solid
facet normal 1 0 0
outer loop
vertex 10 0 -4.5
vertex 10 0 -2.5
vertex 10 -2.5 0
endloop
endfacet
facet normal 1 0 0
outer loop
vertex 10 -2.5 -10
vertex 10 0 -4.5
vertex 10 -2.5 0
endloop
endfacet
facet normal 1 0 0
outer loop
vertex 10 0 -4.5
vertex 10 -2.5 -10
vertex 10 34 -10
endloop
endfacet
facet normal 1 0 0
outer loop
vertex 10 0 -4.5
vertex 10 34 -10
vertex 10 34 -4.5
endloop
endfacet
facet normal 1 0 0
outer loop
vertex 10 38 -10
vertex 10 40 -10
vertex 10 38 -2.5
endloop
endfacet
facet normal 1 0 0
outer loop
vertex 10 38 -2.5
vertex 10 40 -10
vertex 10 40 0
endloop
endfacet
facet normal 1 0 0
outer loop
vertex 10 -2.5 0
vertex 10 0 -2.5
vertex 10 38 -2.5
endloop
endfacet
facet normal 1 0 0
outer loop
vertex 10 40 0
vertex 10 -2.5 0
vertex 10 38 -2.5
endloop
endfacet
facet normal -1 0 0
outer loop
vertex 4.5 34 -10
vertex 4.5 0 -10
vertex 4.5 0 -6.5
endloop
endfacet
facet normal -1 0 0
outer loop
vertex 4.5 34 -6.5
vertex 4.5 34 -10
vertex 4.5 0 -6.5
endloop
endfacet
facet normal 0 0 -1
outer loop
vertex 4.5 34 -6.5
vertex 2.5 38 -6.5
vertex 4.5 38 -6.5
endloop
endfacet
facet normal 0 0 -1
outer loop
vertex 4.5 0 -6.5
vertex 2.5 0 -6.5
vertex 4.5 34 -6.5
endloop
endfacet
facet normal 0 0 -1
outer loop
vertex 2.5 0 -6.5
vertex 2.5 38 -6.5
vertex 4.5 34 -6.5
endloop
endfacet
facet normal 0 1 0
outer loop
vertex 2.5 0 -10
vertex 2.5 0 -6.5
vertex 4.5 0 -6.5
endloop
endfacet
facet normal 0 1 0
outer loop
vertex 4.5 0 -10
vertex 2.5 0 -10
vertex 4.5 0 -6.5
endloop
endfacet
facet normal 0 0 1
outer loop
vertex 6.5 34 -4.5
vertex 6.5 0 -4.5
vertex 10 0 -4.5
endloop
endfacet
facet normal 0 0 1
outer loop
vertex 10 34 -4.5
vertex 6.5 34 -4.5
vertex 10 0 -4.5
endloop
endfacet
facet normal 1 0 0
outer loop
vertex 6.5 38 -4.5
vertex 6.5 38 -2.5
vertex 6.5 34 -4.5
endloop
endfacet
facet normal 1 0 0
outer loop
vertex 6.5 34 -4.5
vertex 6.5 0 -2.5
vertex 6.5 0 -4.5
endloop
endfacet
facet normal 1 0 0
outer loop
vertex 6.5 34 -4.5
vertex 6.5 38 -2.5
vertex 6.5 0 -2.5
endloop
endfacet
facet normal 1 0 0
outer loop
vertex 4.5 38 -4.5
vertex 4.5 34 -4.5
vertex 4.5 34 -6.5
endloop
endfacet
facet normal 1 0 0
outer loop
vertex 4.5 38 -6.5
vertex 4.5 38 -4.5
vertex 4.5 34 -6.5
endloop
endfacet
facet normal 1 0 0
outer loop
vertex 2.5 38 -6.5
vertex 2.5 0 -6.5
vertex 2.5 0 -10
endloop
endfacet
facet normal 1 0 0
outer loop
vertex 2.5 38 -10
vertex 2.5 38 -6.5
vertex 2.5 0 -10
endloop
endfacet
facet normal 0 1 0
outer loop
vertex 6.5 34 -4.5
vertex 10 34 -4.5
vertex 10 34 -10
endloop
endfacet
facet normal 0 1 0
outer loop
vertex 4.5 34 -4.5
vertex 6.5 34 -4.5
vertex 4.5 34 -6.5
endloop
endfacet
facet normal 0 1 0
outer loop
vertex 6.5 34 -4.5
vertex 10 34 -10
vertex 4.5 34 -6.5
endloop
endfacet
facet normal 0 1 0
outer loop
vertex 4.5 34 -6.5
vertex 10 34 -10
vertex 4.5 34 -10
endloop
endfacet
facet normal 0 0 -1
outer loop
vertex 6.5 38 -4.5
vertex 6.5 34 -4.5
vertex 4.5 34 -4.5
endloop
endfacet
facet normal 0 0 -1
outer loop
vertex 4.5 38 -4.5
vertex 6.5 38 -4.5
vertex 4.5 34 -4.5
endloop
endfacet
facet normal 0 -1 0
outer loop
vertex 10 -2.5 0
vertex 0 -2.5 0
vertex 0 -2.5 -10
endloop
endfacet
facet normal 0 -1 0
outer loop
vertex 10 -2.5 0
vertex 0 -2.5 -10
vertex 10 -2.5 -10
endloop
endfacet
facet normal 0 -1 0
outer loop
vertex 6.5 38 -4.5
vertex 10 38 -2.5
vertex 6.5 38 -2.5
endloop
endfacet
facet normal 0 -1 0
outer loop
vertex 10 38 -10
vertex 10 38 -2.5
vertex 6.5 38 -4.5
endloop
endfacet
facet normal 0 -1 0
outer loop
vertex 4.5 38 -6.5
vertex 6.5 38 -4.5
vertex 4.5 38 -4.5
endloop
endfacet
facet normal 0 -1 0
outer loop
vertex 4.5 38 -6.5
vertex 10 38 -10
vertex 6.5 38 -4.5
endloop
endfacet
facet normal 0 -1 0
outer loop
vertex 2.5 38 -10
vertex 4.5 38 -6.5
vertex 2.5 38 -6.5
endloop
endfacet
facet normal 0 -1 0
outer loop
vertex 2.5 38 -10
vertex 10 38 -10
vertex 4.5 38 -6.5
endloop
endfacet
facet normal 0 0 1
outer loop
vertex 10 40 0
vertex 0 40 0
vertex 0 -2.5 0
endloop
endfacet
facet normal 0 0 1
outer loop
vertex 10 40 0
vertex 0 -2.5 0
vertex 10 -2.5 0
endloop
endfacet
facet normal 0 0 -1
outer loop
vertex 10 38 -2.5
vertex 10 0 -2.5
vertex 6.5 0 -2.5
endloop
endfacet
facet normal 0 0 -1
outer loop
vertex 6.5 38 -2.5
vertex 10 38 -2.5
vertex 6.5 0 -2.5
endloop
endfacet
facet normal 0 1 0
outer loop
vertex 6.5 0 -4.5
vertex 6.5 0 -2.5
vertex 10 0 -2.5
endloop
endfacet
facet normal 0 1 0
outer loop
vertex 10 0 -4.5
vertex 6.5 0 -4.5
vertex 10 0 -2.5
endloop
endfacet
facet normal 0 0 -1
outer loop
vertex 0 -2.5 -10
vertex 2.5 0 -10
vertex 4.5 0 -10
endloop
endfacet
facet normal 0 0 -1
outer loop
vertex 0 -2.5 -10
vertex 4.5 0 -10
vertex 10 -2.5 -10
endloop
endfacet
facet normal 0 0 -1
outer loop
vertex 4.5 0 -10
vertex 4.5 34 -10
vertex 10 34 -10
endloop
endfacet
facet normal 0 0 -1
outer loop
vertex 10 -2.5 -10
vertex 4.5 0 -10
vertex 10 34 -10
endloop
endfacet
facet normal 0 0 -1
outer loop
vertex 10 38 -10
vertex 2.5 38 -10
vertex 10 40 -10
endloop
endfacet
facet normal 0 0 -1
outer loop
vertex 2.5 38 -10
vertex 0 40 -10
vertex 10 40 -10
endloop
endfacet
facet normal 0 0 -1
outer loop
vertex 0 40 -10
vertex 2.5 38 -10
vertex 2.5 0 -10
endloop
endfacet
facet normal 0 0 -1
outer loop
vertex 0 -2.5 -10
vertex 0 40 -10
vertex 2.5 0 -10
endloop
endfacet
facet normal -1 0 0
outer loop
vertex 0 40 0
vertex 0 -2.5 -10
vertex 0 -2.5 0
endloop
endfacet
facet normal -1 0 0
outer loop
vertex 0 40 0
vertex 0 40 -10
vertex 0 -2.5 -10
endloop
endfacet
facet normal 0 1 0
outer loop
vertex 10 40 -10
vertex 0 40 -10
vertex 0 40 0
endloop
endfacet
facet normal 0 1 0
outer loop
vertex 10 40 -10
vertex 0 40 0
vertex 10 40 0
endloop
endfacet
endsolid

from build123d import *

# Parameters (mm, degrees)
SKETCH1_W           = 10
SKETCH1_H           = 10
BOSS_EXTRUDE1_DEPTH = 40
SKETCH3_W           = 7.5
SKETCH3_H           = 4
CUT_EXTRUDE1_DEPTH  = 7.5
SKETCH4_W           = 2
SKETCH4_H           = 5.5
CUT_EXTRUDE2_DEPTH  = 38
SKETCH5_W           = 10
SKETCH5_H           = 10
BOSS_EXTRUDE2_DEPTH = 2.5
BOSS_EXTRUDE3_REACH = 44.426
SKETCH6_W           = 1
SKETCH6_H           = 2


with BuildPart() as part:
    # Sketch1 → Boss-Extrude1 (new body)
    with BuildSketch(Plane(origin=(0, 0, 0), x_dir=(1, 0, 0), z_dir=(0, 1, 0))):
        with Locations((5, 5)):
            Rectangle(SKETCH1_W, SKETCH1_H)
    extrude(amount=BOSS_EXTRUDE1_DEPTH)

    # Sketch3 → Cut-Extrude1 (cut)
    with BuildSketch(Plane(origin=(0, 0, -10), x_dir=(-1, 0, 0), z_dir=(0, 0, -1))):
        with Locations((-6.25, 36)):
            Rectangle(SKETCH3_W, SKETCH3_H)
    extrude(amount=-CUT_EXTRUDE1_DEPTH, mode=Mode.SUBTRACT)

    # Sketch4 → Cut-Extrude2 (cut)
    with BuildSketch(Plane.XZ):
        Polygon((10, -2.5), (2.5, -2.5), (2.5, -4.5), (4.5, -4.5), (10, -4.5), align=None)
        with Locations((3.5, -7.25)):
            Rectangle(SKETCH4_W, SKETCH4_H)
    extrude(amount=-CUT_EXTRUDE2_DEPTH, mode=Mode.SUBTRACT)


with BuildPart() as cut_extrude2_piece_1:
    # of the separate pieces the step leaves, piece 1, a body of its own (cut_extrude2_pieces)
    add(part.part.solids().sort_by_distance((0, 0, 0))[0])



with BuildPart() as cut_extrude2_piece_2:
    # of the separate pieces the step leaves, piece 2, a body of its own (cut_extrude2_pieces)
    add(part.part.solids().sort_by_distance((10, 0, -4.5))[0])


with BuildPart() as cut_extrude2_piece_1_1:
    add(cut_extrude2_piece_1.part)

    add(cut_extrude2_piece_2.part)  # Boss-Extrude2 merges Cut-Extrude2 piece 2
    # Sketch5 → Boss-Extrude2 (add)
    with BuildSketch(Plane.XZ):
        with Locations((5, -5)):
            Rectangle(SKETCH5_W, SKETCH5_H)
    extrude(amount=BOSS_EXTRUDE2_DEPTH)

    # Boss-Extrude3: up to this face of the body (flat: up to its plane)
    boss_extrude3_end = Plane(cut_extrude2_piece_1_1.part.faces().sort_by_distance((6.25, 38, -6.25))[0])
    # Sketch6 → Boss-Extrude3 (add, up to the picked face)
    with BuildSketch(Plane(origin=(0, 0, 0), x_dir=(1, 0, 0), z_dir=(0, 1, 0)), mode=Mode.PRIVATE) as boss_extrude3_sk1:
        Polygon((3.5, 4.5), (3.5, 2.5), (6.5, 2.5), (6.5, 4.5), (4.5, 4.5), align=None)
    boss_extrude3_tool1 = split(extrude(boss_extrude3_sk1.sketch, amount=BOSS_EXTRUDE3_REACH, mode=Mode.PRIVATE), bisect_by=boss_extrude3_end, keep=Keep.BOTH, mode=Mode.PRIVATE)
    # Sketch6 → Boss-Extrude3 (add, up to the picked face)
    with BuildSketch(Plane(origin=(0, 0, 0), x_dir=(1, 0, 0), z_dir=(0, 1, 0)), mode=Mode.PRIVATE) as boss_extrude3_sk2:
        with Locations((4, 5.5)):
            Rectangle(SKETCH6_W, SKETCH6_H)
    boss_extrude3_tool2 = split(extrude(boss_extrude3_sk2.sketch, amount=BOSS_EXTRUDE3_REACH, mode=Mode.PRIVATE), bisect_by=boss_extrude3_end, keep=Keep.BOTH, mode=Mode.PRIVATE)
    # Sketch6 → Boss-Extrude3 (add, up to the picked face)
    with BuildSketch(Plane(origin=(0, 0, 0), x_dir=(1, 0, 0), z_dir=(0, 1, 0)), mode=Mode.PRIVATE) as boss_extrude3_sk3:
        with Locations((3, 5.5)):
            Rectangle(SKETCH6_W, SKETCH6_H)
    boss_extrude3_tool3 = split(extrude(boss_extrude3_sk3.sketch, amount=BOSS_EXTRUDE3_REACH, mode=Mode.PRIVATE), bisect_by=boss_extrude3_end, keep=Keep.BOTH, mode=Mode.PRIVATE)
    # Sketch6 → Boss-Extrude3 (add, up to the picked face)
    with BuildSketch(Plane(origin=(0, 0, 0), x_dir=(1, 0, 0), z_dir=(0, 1, 0)), mode=Mode.PRIVATE) as boss_extrude3_sk4:
        with Locations((3, 3.5)):
            Rectangle(SKETCH6_W, SKETCH6_H)
    boss_extrude3_tool4 = split(extrude(boss_extrude3_sk4.sketch, amount=BOSS_EXTRUDE3_REACH, mode=Mode.PRIVATE), bisect_by=boss_extrude3_end, keep=Keep.BOTH, mode=Mode.PRIVATE)
    add(boss_extrude3_tool1.solids().sort_by(Axis((5, 0, -3.5), (0, 1, 0)))[0])
    add(boss_extrude3_tool2.solids().sort_by(Axis((4, 0, -5.5), (0, 1, 0)))[0])
    add(boss_extrude3_tool3.solids().sort_by(Axis((3, 0, -5.5), (0, 1, 0)))[0])
    add(boss_extrude3_tool4.solids().sort_by(Axis((3, 0, -3.5), (0, 1, 0)))[0])


solid = cut_extrude2_piece_1_1.part
